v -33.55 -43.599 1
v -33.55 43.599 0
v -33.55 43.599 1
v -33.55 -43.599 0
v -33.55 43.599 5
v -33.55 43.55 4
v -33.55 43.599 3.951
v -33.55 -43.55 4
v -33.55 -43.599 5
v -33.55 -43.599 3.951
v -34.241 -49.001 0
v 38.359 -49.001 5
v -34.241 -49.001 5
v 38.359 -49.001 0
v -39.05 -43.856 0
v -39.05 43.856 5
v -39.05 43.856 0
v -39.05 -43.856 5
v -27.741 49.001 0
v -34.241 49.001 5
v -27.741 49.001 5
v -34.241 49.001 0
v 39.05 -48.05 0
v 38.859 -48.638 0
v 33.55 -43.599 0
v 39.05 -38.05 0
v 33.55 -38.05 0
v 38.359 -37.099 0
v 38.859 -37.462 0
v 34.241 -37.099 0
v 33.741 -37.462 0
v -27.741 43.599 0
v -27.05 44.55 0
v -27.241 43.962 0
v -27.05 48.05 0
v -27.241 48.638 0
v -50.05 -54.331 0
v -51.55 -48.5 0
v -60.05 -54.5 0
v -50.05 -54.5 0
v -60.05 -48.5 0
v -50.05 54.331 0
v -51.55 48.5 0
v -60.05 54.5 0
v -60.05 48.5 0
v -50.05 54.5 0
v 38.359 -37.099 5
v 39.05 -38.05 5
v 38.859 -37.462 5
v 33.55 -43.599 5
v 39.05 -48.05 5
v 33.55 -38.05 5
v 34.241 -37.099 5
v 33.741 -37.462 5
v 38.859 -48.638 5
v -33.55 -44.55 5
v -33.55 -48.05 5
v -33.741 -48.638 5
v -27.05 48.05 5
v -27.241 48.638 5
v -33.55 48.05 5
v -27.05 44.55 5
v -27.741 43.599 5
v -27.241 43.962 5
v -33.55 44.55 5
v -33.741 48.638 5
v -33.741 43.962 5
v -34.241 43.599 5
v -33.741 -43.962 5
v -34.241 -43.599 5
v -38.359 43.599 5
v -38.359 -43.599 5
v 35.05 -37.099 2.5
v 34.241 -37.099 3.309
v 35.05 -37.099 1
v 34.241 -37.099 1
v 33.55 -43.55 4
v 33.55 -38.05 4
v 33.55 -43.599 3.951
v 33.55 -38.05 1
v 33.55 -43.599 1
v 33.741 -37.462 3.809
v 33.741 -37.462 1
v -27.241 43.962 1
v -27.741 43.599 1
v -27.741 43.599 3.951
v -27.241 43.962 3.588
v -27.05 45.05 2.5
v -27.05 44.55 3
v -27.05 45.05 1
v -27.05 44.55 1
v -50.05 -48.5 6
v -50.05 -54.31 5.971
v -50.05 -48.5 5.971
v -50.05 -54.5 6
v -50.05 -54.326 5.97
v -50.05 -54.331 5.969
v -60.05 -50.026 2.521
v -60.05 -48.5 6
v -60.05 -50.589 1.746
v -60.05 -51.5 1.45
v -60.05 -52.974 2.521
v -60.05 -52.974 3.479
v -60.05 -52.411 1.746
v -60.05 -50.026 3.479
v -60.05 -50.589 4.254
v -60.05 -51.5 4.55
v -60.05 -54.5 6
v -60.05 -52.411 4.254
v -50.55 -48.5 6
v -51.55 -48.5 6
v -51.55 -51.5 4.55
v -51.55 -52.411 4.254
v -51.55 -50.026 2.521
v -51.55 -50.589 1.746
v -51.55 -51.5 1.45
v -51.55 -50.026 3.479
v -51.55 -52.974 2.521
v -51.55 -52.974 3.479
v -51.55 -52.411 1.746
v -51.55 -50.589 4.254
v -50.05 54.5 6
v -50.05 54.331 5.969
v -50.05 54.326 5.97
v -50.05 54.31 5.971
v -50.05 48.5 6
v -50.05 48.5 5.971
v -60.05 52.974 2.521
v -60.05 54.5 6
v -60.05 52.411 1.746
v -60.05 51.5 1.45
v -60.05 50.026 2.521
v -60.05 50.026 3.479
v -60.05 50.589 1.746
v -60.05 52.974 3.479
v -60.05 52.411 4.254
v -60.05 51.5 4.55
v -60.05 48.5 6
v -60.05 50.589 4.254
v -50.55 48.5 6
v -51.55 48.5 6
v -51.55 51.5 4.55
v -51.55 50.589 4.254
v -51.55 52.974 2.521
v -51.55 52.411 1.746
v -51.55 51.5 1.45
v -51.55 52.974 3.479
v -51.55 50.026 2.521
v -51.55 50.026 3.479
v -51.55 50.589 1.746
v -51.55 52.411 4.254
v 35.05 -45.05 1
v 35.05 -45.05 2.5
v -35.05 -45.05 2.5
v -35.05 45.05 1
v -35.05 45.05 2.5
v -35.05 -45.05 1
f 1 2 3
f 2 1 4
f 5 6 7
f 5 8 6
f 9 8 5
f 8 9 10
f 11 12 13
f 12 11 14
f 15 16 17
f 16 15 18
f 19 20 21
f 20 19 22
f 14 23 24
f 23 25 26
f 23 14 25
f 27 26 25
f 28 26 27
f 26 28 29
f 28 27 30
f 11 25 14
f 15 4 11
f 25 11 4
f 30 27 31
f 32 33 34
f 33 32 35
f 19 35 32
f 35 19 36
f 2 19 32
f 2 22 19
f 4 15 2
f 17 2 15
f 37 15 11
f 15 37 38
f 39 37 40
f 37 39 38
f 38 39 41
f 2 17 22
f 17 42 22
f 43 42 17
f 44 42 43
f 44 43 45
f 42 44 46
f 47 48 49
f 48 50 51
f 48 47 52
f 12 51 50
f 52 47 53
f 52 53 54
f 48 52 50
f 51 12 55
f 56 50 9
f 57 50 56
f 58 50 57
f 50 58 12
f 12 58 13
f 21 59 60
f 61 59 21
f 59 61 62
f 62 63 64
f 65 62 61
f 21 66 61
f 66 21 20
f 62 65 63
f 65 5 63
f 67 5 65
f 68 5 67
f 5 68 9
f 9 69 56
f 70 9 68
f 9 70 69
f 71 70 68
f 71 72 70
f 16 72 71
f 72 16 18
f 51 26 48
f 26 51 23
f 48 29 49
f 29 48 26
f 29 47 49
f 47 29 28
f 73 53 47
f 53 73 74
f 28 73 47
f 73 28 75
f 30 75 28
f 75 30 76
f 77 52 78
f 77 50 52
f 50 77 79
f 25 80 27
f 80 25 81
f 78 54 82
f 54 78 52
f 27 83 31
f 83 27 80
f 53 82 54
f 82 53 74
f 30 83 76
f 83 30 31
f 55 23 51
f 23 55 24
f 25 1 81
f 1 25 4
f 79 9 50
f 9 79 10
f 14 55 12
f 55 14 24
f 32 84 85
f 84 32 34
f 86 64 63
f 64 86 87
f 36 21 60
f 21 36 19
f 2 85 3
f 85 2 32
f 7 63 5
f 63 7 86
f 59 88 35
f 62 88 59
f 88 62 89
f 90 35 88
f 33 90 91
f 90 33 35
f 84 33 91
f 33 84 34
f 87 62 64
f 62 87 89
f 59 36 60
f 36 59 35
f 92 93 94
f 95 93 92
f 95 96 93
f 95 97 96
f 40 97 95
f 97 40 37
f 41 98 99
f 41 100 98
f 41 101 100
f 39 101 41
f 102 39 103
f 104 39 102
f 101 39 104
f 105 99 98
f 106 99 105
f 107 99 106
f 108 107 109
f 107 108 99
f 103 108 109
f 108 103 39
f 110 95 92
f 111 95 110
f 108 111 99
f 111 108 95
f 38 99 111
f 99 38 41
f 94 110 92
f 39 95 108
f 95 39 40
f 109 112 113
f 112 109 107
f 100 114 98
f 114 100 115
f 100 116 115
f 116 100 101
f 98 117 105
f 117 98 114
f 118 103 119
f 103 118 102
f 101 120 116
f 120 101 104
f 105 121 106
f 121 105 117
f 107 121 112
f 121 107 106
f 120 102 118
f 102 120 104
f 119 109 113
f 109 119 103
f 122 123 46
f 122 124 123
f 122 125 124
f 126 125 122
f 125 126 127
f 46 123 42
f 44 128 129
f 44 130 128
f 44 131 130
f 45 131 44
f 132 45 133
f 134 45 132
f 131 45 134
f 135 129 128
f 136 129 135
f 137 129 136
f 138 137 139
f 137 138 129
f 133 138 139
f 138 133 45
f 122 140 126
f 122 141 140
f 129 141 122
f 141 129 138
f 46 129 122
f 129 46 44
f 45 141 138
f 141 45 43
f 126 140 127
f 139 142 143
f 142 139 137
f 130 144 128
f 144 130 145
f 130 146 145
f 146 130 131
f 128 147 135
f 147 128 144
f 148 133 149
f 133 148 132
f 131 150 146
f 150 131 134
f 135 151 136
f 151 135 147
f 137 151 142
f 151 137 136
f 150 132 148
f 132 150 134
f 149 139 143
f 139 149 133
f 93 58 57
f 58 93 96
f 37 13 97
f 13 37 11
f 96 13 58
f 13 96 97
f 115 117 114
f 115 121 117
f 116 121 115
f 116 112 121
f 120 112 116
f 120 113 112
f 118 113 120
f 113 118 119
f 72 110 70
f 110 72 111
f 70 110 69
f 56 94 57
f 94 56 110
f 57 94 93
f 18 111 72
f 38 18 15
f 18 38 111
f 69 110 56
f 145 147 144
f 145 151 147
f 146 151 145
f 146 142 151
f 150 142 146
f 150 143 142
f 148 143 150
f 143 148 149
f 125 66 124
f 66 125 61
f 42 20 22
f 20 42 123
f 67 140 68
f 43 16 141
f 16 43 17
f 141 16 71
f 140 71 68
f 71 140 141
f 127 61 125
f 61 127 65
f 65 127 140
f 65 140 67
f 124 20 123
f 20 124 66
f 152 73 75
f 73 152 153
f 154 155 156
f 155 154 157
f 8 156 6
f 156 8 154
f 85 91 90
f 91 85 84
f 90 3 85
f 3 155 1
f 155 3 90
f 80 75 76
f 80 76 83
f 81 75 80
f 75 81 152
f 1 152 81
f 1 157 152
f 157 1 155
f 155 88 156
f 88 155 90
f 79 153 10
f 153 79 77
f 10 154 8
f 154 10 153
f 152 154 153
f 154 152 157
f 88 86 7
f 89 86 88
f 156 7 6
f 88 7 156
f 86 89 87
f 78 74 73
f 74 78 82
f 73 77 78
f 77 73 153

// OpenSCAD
// first stab at a generalized pcb holder for modular synths
// 3-clause BSD, jef@slechte.info, 2020

pcb_t = 1.5;
pcb_h = 90.1;
pcb_d = 70.1;

bolt_r = 3.1/2;
front_plate_bolt_distance = 103;
front_plate_mount_block_s = 6;
front_plate_mount_block_d = 10;

plate_pcb_offset = 20;

rounded_corners_r = 1;

latch = 8;

lip_w = 1.5;
rail_w = 4;

lip_t = lip_w;
bottom_t = 1;
top_t = 1;

$fn = 10;
/*
 *   +---------------+  \
 *   |               |   ) top_t
 *   |               |  /
 *   |              /   \
 *   |            /      ) lip_t
 *   |          /       /
 *   |         |        \
 *   |         |         ) pcb_t
 *   |         |        /
 *   |         +-----+  \
 *   |               |   ) bottom_t
 *   +---------------+  /
 *    \        /\    /
 *      rail_w  lip_w
*/
 
module pcb_cutout() {
    lip_d = pcb_d - (2*lip_w);
    lip_h = pcb_h - (2*lip_w);
	
	translate([0, 0, bottom_t + (pcb_t/2)]) {
		hull() {
			cube([pcb_d, pcb_h, pcb_t], center=true);    
			translate([0, 0, pcb_t])
				cube([lip_d, lip_h, lip_t], center=true);
		}
	}
}

module rounded_cube(coords) {
	r = rounded_corners_r;
	hull() {
		for (a = [ -1, 1 ]) {
			for (b = [ -1, 1 ]) {
				translate([a*(coords[0]/2-r), b*(coords[1]/2-r), 0])
					cylinder(r=r, h=coords[2], center=true);
			}
		}
	}
}
module rails() {
    total_t = bottom_t + pcb_t + lip_t + top_t;
    total_w = rail_w + lip_w;
    total_pcb_d = pcb_d;
    total_pcb_h = pcb_h;// + 2*latch;
	// a nudge is defined as the difference between the
	// half of a rail and the lip insection in the rail
	a_nudge = total_w/2 - lip_w;
	
	// everything up so our bottom edge is on the XY plane
    translate([0, 0, total_t/2]) {
        // front
		front_length = pcb_h + rail_w*2;
        translate([-(pcb_d/2+a_nudge), 0, 0])
			rounded_cube([total_w, front_length, total_t]);
        
        // back
		back_length = latch + rail_w;
        translate([+(pcb_d/2+a_nudge), 0, 0])
			translate([0, -(pcb_h/2-(back_length)/2+rail_w), 0])
				rounded_cube([total_w, back_length, total_t]);
        
        // bottom
		bottom_length = pcb_d + rail_w*2;
        translate([0, -(pcb_h/2+a_nudge), 0])
			rounded_cube([bottom_length, total_w, total_t]);
    
        // top
		top_length = latch + rail_w;
        translate([-(pcb_d/2-(top_length)/2+rail_w), 0, 0])
			translate([0, (pcb_h/2+a_nudge), 0])
				rounded_cube([top_length, total_w, total_t]);
    }
}
module rails_top() {
    total_t = bottom_t + pcb_t + lip_t + top_t;
    total_w = rail_w + lip_w;
    total_pcb_d = pcb_d;
    total_pcb_h = pcb_h;// + 2*latch;
	// a nudge is defined as the difference between the
	// half of a rail and the lip insection in the rail
	a_nudge = total_w/2 - lip_w;
	
	// everything up so our bottom edge is on the XY plane
    translate([0, 0, total_t/2]) {
		translate([-(pcb_d/2+a_nudge), -(pcb_h/2+a_nudge), 0])
			rounded_cube([total_w, total_w, total_t]);
    }
}
module rails_bottom() {
    total_t = bottom_t + pcb_t + lip_t + top_t;
    total_w = rail_w + lip_w;
    total_pcb_d = pcb_d;
    total_pcb_h = pcb_h;// + 2*latch;
	// a nudge is defined as the difference between the
	// half of a rail and the lip insection in the rail
	a_nudge = total_w/2 - lip_w;
	
	// everything up so our bottom edge is on the XY plane
    translate([0, 0, total_t/2]) {
		translate([-(pcb_d/2+a_nudge), +(pcb_h/2+a_nudge), 0])
			rounded_cube([total_w, total_w, total_t]);
    }
} 
module front_plate_mounting() {

	block_s = front_plate_mount_block_s;
	block_d = front_plate_mount_block_d;

	translate([
	 -(pcb_d/2 + plate_pcb_offset),
	 0,
	 block_s/2])
	 
	rotate([0, 90, 0])
	for (side = [-1, 1]) {
		translate([0, front_plate_bolt_distance/2*side, 0])
			difference() {
				cube([block_s, block_s, block_d], center=true);
				cylinder(r=bolt_r, h=block_d, center=true);
			}
	}
	 
}
module front_plate_mounting_slice_top() {

	block_s = front_plate_mount_block_s;
	block_d = front_plate_mount_block_d;
	slice_d = 1;

	translate([
	 -(pcb_d/2 + plate_pcb_offset),
	 0,
	 block_s/2])
	 
	rotate([0, 90, 0]) {
		side = -1;
		translate([0, front_plate_bolt_distance/2*side,
			(block_d/2-slice_d/1)])
			cube([block_s, block_s, slice_d], center=true);
	}
	 
 }
module front_plate_mounting_slice_bottom() {

	block_s = front_plate_mount_block_s;
	block_d = front_plate_mount_block_d;
	slice_d = 1;

	translate([
	 -(pcb_d/2 + plate_pcb_offset),
	 0,
	 block_s/2])
	 
	rotate([0, 90, 0]) {
		side = 1;
		translate([0, front_plate_bolt_distance/2*side,
			(block_d/2-slice_d/1)])
			cube([block_s, block_s, slice_d], center=true);
	}
	 
 }
difference() {
	union() {
		rails();
		front_plate_mounting();
		hull() {
			rails_top();
			front_plate_mounting_slice_top();
		}
		hull() {
			rails_bottom();
			front_plate_mounting_slice_bottom();
		}
	}
	pcb_cutout();
}
